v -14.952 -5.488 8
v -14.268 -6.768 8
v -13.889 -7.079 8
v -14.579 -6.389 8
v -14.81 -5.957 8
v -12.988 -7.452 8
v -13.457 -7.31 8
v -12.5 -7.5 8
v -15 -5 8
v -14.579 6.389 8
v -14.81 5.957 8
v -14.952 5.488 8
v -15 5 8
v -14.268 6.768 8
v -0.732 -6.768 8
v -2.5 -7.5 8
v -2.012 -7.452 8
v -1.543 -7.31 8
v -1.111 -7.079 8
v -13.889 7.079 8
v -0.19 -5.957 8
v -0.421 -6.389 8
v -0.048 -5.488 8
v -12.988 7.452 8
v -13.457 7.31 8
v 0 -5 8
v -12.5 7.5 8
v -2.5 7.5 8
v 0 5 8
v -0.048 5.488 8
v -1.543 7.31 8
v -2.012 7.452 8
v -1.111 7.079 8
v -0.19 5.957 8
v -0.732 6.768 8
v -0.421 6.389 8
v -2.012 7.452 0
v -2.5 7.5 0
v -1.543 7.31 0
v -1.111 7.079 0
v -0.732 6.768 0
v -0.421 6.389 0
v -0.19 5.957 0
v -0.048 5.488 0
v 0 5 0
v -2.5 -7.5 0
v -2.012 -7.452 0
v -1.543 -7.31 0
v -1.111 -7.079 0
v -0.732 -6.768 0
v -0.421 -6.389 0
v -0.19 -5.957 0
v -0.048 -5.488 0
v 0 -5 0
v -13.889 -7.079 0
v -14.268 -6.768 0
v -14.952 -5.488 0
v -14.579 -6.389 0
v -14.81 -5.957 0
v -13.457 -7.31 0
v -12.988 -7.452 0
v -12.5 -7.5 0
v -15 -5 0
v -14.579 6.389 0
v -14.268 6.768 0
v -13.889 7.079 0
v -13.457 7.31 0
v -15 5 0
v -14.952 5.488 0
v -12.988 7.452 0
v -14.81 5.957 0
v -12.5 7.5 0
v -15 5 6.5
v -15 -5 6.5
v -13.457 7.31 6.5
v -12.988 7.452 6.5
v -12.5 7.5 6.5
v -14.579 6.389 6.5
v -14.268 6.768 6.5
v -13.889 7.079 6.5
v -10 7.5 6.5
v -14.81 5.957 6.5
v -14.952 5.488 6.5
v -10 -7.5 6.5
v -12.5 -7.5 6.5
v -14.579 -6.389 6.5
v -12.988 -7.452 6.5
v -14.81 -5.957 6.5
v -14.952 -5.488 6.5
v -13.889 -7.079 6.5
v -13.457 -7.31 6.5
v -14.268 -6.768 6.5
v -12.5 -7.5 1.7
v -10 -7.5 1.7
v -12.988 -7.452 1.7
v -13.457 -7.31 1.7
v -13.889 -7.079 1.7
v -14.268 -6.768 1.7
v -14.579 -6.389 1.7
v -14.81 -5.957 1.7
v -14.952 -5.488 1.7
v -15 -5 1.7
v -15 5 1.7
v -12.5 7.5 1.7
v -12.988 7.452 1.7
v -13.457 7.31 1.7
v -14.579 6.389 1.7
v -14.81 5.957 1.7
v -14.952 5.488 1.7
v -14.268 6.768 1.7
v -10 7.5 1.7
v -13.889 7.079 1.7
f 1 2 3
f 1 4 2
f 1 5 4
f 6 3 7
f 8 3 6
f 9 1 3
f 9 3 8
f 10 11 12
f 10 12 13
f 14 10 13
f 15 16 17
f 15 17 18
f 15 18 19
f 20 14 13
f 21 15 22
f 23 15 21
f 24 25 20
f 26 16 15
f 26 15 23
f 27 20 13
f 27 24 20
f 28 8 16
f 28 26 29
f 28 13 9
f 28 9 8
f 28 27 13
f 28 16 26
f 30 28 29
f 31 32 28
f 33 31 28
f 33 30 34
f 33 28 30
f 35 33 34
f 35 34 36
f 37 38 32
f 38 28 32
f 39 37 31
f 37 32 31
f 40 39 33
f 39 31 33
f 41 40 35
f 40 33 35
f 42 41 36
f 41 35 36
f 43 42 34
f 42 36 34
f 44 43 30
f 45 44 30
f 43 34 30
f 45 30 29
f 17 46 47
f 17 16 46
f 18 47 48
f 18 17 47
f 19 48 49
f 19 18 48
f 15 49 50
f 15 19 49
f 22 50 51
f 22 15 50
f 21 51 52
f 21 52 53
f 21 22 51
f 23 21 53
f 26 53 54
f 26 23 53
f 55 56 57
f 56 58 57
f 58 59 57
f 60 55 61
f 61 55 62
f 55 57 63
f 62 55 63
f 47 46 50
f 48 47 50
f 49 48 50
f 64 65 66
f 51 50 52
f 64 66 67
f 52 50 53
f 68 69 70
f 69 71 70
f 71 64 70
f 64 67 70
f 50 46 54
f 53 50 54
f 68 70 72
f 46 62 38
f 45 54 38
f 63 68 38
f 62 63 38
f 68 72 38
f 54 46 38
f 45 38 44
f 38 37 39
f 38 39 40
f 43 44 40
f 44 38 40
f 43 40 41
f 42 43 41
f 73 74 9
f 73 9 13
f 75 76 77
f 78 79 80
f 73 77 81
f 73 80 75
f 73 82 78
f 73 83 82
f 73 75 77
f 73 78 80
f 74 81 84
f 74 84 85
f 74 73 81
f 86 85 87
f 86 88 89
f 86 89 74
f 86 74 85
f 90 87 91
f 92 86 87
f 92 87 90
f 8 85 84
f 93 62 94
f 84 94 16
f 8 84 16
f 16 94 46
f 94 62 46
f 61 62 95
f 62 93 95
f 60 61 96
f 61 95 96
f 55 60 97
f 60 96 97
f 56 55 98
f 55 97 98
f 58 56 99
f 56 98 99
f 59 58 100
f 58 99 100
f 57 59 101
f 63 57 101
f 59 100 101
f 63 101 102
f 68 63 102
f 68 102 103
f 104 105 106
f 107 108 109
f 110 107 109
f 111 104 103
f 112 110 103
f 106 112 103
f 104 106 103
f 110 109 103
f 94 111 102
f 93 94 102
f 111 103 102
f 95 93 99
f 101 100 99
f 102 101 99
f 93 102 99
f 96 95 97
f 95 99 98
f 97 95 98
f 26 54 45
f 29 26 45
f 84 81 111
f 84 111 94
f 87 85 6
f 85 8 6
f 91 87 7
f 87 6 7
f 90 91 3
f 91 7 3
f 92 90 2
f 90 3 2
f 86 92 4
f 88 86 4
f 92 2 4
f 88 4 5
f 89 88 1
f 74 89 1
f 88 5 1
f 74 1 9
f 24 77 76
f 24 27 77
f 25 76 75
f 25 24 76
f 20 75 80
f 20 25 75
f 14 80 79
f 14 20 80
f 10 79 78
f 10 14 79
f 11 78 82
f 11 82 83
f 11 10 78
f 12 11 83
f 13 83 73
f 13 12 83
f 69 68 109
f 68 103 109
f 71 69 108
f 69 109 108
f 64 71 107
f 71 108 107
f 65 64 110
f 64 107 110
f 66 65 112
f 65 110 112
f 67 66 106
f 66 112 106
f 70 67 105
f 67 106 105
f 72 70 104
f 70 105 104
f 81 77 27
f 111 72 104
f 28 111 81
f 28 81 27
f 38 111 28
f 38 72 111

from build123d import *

# Parameters (mm, degrees)
F0_W     = 15
F0_H     = 15
F1_DEPTH = 8
F2_W     = 15
F2_H     = 4.8
F3_DEPTH = 5
F4_R     = 2.5
F5_R     = 2.5


with BuildPart() as f1:
    # F0 (on Top) → F1 (new body)
    with BuildSketch(Plane.XY):
        with Locations((-7.5, 0)):
            Rectangle(F0_W, F0_H)
    extrude(amount=F1_DEPTH)

    # F2 (on face) → F3 (cut)
    with BuildSketch(Plane(origin=(-15, 0, 0), x_dir=(0, -1, 0), z_dir=(-1, 0, 0))):
        with Locations((0, 4.1)):
            Rectangle(F2_W, F2_H)
    extrude(amount=-F3_DEPTH, mode=Mode.SUBTRACT)

    # F4
    f4_edges = [f1.edges().sort_by_distance(p)[0] for p in [
        (0, -7.5, 4),
        (0, 7.5, 4),
    ]]
    fillet(f4_edges, radius=F4_R)

    # F5
    f5_edges = [f1.edges().sort_by_distance(p)[0] for p in [
        (-15, -7.5, 0.85),
        (-15, -7.5, 7.25),
        (-15, 7.5, 0.85),
        (-15, 7.5, 7.25),
    ]]
    fillet(f5_edges, radius=F5_R)


solid = f1.part
